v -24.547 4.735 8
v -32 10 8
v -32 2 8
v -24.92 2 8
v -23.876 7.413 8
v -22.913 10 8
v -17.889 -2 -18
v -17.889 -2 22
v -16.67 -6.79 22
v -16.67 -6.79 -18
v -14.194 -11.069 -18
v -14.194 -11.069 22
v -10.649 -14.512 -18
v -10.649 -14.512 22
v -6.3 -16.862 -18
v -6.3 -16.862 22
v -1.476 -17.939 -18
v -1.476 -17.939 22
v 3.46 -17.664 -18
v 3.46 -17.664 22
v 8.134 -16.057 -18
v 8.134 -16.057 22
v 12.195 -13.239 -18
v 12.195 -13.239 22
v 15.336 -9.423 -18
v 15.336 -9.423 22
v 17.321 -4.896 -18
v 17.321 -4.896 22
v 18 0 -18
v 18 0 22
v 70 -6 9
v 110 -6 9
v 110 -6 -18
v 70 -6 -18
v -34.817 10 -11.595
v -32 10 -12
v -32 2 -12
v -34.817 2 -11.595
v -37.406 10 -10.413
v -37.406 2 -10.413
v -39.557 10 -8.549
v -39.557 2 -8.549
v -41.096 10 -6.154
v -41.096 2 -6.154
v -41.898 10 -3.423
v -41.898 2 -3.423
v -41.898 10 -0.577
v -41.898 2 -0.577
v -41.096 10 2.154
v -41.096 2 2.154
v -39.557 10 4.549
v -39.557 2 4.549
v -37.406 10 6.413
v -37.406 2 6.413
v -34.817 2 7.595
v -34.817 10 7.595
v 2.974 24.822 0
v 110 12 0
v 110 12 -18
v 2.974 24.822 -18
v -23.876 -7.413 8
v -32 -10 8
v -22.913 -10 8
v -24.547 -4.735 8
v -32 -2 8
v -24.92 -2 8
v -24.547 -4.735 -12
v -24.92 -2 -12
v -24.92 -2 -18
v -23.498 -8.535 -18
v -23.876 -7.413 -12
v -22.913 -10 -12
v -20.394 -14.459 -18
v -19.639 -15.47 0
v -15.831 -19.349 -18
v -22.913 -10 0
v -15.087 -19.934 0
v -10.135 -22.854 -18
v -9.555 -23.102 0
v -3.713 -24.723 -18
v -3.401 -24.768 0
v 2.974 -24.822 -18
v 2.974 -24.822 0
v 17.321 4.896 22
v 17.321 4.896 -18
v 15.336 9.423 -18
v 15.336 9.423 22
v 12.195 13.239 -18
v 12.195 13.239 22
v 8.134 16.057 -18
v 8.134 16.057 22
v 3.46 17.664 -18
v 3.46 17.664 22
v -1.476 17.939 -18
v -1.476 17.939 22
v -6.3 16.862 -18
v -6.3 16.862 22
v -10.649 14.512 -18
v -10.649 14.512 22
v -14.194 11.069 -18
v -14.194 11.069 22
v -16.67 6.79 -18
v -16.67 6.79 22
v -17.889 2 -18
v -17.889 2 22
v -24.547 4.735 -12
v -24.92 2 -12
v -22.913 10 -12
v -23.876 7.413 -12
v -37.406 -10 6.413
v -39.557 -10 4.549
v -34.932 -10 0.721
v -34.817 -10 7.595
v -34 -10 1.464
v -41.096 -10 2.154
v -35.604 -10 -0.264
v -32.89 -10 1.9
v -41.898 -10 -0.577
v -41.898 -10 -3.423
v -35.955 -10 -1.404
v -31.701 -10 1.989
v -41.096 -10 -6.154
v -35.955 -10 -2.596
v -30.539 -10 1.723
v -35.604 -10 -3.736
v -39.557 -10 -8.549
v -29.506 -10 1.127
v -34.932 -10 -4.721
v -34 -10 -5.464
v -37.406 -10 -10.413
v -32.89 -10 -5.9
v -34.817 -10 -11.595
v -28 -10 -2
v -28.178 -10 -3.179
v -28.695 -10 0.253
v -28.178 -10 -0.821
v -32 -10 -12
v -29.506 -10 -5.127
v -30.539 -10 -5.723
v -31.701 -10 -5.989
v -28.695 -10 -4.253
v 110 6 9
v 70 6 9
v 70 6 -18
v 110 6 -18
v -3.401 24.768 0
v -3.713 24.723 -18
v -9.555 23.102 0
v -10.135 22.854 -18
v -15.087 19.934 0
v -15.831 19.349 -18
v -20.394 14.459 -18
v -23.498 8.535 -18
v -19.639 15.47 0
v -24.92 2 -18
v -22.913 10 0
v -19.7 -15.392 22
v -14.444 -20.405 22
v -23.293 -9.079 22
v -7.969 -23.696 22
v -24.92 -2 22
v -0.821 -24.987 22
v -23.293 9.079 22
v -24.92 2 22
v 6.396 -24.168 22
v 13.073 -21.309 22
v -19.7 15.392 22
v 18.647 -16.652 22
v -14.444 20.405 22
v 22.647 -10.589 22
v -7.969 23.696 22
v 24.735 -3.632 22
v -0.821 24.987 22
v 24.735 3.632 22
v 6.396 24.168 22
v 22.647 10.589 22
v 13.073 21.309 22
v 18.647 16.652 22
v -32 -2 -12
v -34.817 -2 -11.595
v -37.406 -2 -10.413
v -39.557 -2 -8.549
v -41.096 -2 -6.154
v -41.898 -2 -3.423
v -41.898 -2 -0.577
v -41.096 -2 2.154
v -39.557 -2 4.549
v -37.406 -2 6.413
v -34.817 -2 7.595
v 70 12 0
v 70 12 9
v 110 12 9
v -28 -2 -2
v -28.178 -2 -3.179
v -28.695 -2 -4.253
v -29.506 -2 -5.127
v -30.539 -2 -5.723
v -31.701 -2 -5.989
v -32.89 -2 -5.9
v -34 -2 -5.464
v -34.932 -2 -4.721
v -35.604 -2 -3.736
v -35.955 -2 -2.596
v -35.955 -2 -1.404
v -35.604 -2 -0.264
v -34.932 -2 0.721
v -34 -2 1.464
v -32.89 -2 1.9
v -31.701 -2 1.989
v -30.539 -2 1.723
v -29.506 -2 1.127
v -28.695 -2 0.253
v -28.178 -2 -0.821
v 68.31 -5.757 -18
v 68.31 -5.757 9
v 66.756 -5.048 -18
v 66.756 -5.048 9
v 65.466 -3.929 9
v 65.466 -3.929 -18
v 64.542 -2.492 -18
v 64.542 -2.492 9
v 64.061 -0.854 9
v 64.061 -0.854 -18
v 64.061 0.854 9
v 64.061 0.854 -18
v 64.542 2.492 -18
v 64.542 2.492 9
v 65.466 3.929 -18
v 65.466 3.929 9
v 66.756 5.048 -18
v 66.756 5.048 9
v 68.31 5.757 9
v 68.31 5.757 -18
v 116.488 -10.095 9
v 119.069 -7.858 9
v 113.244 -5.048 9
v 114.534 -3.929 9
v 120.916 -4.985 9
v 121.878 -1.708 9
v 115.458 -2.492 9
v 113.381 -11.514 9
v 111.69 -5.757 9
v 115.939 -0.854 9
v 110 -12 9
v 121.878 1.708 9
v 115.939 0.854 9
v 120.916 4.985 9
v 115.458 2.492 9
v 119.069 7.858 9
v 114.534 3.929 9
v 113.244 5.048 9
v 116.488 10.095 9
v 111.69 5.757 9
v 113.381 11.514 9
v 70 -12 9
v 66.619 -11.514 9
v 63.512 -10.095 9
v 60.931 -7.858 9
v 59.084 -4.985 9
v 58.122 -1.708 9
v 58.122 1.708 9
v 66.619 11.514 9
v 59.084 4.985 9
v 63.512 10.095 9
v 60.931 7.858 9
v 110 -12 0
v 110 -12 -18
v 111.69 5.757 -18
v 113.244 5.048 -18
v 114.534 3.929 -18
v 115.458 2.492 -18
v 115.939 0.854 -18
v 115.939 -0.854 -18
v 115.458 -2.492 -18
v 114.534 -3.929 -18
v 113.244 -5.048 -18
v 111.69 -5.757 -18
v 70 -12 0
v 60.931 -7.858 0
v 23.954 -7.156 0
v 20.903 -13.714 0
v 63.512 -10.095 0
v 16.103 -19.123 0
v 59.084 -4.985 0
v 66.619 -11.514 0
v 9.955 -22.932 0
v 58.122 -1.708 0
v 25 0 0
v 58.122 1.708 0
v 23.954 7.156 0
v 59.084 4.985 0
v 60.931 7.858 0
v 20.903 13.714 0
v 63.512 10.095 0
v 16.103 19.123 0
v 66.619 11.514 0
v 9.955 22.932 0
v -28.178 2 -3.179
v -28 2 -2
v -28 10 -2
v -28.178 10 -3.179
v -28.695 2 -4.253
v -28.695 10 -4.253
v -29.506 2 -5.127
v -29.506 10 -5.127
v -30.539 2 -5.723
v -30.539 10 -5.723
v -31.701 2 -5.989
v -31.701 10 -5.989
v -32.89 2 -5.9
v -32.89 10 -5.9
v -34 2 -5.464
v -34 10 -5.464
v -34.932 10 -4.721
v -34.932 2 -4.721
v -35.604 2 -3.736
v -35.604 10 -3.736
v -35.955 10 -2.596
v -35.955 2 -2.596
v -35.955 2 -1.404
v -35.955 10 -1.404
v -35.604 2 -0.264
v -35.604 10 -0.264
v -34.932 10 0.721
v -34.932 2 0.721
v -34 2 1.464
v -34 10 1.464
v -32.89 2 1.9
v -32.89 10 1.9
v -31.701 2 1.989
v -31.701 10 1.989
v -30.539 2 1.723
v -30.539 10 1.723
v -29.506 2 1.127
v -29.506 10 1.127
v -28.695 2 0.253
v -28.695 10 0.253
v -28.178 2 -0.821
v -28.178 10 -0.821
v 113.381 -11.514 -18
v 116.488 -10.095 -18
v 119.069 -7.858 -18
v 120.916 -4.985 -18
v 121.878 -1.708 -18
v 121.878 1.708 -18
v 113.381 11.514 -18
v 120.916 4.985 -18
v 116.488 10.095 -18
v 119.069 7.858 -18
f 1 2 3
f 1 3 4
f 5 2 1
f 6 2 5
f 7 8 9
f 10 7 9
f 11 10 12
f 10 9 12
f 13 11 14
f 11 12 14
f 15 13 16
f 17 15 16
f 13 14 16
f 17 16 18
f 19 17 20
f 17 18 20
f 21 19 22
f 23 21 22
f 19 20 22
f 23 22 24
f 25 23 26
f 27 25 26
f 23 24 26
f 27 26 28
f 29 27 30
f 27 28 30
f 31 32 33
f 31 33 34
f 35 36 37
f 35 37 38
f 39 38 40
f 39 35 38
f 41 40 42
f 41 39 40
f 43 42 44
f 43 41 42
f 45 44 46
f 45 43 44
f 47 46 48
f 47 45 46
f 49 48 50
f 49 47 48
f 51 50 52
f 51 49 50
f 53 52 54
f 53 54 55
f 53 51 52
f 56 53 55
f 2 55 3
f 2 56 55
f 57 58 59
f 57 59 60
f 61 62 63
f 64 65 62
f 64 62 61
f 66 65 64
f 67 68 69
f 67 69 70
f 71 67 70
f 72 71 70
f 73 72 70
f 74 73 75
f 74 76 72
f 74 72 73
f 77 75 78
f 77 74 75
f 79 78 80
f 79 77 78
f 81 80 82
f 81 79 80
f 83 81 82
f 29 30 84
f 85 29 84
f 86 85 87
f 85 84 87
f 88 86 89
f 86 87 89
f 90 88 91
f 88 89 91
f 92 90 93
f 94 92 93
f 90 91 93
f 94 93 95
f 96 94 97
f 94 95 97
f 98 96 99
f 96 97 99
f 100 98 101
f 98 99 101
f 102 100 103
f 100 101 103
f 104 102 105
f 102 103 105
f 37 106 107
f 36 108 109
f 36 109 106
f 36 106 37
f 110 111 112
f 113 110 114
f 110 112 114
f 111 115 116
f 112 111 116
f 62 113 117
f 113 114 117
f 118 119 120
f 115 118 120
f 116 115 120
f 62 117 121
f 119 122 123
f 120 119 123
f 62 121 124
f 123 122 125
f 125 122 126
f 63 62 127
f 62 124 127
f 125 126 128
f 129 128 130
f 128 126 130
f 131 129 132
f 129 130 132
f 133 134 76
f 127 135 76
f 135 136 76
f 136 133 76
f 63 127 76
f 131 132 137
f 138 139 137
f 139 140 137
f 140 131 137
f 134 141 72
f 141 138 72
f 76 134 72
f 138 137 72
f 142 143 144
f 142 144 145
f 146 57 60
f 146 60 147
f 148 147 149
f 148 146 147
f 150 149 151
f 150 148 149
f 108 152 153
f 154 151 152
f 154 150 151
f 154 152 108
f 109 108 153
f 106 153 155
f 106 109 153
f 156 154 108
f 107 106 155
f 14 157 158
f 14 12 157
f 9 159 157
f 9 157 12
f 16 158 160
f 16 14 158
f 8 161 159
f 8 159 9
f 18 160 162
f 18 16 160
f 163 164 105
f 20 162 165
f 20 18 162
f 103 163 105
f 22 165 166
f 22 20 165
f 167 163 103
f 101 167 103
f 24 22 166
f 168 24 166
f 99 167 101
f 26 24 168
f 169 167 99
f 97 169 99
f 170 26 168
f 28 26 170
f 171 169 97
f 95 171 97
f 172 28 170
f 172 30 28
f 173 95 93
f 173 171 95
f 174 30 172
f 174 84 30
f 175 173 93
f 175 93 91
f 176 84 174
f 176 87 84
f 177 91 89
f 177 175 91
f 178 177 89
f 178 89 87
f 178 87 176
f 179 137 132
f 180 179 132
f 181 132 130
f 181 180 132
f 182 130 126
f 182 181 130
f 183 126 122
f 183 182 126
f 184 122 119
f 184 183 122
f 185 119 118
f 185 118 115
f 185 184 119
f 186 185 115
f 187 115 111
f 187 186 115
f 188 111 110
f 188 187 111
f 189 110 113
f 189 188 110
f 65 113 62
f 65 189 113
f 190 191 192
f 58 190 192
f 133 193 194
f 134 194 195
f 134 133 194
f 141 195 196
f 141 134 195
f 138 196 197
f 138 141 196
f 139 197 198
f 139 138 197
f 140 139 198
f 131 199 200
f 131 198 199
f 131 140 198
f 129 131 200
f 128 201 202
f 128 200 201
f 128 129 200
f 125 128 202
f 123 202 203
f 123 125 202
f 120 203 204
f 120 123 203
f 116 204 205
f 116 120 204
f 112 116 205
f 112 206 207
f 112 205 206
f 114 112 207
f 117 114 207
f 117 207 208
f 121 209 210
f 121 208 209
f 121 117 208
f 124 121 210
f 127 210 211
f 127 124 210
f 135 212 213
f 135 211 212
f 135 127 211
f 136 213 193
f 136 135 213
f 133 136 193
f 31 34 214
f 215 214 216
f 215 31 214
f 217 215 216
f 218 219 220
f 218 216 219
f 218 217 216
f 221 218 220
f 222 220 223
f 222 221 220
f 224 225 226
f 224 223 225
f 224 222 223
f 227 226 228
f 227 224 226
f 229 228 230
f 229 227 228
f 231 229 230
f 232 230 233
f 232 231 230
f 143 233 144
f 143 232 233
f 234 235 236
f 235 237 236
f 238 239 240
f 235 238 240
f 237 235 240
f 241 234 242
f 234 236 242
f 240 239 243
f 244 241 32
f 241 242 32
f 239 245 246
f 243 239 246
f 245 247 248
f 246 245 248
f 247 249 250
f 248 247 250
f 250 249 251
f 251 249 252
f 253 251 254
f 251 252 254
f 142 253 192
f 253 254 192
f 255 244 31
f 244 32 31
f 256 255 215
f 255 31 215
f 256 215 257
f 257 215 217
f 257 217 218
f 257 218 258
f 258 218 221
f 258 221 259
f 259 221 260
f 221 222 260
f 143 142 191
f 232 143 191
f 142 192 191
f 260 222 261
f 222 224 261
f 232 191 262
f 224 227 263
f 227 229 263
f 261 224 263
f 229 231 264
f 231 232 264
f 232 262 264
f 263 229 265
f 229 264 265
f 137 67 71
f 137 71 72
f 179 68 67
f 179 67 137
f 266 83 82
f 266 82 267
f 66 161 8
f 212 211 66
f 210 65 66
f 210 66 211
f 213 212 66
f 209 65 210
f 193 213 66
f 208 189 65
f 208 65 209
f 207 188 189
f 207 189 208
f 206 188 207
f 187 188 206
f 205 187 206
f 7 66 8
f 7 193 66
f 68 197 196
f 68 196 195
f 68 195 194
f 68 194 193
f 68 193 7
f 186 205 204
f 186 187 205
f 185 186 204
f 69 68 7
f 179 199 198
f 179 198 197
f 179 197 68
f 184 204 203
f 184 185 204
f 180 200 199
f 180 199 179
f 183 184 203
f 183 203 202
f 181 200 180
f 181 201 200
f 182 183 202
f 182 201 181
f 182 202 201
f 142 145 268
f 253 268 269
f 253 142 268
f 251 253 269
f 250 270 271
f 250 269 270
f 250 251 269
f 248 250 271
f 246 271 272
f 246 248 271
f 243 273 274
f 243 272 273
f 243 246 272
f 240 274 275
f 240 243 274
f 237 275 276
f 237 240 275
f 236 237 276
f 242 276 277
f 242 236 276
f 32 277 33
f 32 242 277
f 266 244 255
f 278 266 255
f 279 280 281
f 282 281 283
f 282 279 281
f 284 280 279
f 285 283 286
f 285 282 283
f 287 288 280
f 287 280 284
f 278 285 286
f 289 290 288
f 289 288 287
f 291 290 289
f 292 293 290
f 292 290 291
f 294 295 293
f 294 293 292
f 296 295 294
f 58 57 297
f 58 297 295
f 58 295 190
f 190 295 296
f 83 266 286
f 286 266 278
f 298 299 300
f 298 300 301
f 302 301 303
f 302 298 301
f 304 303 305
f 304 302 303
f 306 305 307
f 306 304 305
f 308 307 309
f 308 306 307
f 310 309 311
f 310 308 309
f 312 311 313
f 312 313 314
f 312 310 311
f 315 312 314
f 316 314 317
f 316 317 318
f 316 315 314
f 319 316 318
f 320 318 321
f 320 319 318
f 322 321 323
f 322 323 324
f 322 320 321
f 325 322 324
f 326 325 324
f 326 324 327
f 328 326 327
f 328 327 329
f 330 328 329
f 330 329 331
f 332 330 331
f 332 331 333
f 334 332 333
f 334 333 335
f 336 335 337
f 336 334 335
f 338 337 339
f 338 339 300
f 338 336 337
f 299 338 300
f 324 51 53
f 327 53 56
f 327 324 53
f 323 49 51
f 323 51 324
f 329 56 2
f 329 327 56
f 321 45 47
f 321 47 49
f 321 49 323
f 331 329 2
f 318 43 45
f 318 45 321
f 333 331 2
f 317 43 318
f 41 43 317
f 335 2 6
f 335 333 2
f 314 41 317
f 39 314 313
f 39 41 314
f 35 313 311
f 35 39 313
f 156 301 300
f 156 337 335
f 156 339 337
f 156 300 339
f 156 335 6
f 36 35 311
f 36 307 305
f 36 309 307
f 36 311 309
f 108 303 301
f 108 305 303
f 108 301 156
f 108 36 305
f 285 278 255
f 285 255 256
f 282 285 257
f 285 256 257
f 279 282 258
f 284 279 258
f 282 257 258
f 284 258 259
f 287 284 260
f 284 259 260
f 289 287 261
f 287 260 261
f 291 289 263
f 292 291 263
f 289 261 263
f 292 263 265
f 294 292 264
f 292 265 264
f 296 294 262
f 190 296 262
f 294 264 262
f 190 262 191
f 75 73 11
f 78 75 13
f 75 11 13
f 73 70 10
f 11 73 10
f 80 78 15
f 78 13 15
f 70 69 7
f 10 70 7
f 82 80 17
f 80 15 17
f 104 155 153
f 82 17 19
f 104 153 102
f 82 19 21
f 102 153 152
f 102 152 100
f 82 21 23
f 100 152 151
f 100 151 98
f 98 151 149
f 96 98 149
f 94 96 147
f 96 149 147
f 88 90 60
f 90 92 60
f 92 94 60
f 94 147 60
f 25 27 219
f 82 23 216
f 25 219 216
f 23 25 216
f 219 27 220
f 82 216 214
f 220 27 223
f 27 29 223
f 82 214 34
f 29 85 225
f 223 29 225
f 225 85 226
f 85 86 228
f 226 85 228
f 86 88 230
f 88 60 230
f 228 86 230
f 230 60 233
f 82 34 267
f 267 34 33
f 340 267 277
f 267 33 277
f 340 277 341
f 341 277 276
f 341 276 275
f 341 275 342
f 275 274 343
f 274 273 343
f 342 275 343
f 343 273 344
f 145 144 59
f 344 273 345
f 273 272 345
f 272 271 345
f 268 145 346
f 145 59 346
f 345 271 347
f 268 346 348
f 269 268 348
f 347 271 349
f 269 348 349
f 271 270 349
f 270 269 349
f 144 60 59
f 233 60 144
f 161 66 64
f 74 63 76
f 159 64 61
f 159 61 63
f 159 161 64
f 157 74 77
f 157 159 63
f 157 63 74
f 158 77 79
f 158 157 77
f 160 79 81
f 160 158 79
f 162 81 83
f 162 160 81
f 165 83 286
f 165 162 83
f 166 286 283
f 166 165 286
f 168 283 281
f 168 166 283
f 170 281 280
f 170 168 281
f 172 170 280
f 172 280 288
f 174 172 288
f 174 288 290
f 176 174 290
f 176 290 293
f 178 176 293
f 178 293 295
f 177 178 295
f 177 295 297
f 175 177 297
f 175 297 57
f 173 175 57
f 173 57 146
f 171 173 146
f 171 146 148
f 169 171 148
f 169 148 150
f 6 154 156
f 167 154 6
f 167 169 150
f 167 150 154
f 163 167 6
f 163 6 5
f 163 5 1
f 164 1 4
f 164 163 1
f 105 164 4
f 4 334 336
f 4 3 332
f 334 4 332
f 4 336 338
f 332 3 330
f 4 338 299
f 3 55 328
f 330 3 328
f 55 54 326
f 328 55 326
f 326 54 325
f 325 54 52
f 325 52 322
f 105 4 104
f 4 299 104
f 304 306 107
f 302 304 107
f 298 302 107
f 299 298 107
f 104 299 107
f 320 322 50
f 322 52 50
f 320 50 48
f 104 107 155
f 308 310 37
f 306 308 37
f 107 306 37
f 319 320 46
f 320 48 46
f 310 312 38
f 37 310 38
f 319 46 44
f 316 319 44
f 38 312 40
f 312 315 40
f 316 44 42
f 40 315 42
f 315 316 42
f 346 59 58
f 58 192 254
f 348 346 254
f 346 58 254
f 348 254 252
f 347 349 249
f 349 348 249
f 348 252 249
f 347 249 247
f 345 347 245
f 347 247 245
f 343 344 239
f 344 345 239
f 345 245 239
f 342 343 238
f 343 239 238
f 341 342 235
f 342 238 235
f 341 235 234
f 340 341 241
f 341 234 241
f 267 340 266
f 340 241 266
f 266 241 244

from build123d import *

# Parameters (mm, degrees)
BOSS_EXTRUDE1_DEPTH = 18
BOSS_EXTRUDE2_DEPTH = 9
CUT_EXTRUDE1_DEPTH  = 28
SKETCH3_R           = 25
SKETCH3_R_2         = 18
BOSS_EXTRUDE3_DEPTH = 22
SKETCH3_2_R         = 18
CUT_EXTRUDE2_DEPTH  = 41
SKETCH6_R           = 4
BOSS_EXTRUDE5_DEPTH = 10
SKETCH7_W           = 57.081853501
SKETCH7_H           = 4
CUT_EXTRUDE3_DEPTH  = 40


with BuildPart() as part:
    # Sketch1 → Boss-Extrude1 (new body)
    with BuildSketch(Plane.XY):
        with BuildLine():
            Line((110, 12), (2.973910519, 24.822486906))
            ThreePointArc((2.973910519, 24.822486906), (-25, 0), (2.973910519, -24.822486906))
            Line((2.973910519, -24.822486906), (110, -12))
            ThreePointArc((110, -12), (122, 0), (110, 12))
        make_face()
    extrude(amount=-BOSS_EXTRUDE1_DEPTH)

    # Sketch2 → Boss-Extrude2 (add)
    with BuildSketch(Plane.XY.offset(9)):
        with BuildLine():
            Line((110, -12), (70, -12))
            ThreePointArc((70, -12), (58, 0), (70, 12))
            Line((70, 12), (110, 12))
            ThreePointArc((110, 12), (122, 0), (110, -12))
        make_face()
        with BuildLine():
            Line((70, 6), (110, 6))
            ThreePointArc((110, 6), (116, 0), (110, -6))
            Line((110, -6), (70, -6))
            ThreePointArc((70, -6), (64, 0), (70, 6))
        make_face(mode=Mode.SUBTRACT)
    extrude(amount=-BOSS_EXTRUDE2_DEPTH)

    # Sketch2<2> → Cut-Extrude1 (cut, through all)
    with BuildSketch(Plane.XY.offset(9)):
        with BuildLine():
            Line((70, -6), (110, -6))
            ThreePointArc((110, -6), (116, 0), (110, 6))
            Line((110, 6), (70, 6))
            ThreePointArc((70, 6), (64, 0), (70, -6))
        make_face()
    extrude(amount=-CUT_EXTRUDE1_DEPTH, mode=Mode.SUBTRACT)

    # Sketch3 → Boss-Extrude3 (add)
    with BuildSketch(Plane.XY.offset(22)):
        Circle(SKETCH3_R)
        Circle(SKETCH3_R_2, mode=Mode.SUBTRACT)
    extrude(amount=-BOSS_EXTRUDE3_DEPTH)

    # Sketch3<2> → Cut-Extrude2 (cut, through all)
    with BuildSketch(Plane.XY.offset(22)):
        Circle(SKETCH3_2_R)
    extrude(amount=-CUT_EXTRUDE2_DEPTH, mode=Mode.SUBTRACT)

    # Sketch6 → Boss-Extrude5 (add, symmetric)
    with BuildSketch(Plane(origin=(0, 0, 0), x_dir=(1, 0, 0), z_dir=(0, 1, 0))):
        with BuildLine():
            Line((-19, 12), (-32, 12))
            ThreePointArc((-32, 12), (-42, 2), (-32, -8))
            Line((-32, -8), (-19, -8))
            Line((-19, -8), (-19, 12))
        make_face()
        with Locations((-32, 2)):
            Circle(SKETCH6_R, mode=Mode.SUBTRACT)
    extrude(amount=BOSS_EXTRUDE5_DEPTH, both=True)

    # Sketch7 → Cut-Extrude3 (cut)
    with BuildSketch(Plane(origin=(-42, 0, 0), x_dir=(0, 0, -1), z_dir=(1, 0, 0))):
        with Locations((1.514511954, 0)):
            Rectangle(SKETCH7_W, SKETCH7_H)
    extrude(amount=CUT_EXTRUDE3_DEPTH, mode=Mode.SUBTRACT)


solid = part.part
